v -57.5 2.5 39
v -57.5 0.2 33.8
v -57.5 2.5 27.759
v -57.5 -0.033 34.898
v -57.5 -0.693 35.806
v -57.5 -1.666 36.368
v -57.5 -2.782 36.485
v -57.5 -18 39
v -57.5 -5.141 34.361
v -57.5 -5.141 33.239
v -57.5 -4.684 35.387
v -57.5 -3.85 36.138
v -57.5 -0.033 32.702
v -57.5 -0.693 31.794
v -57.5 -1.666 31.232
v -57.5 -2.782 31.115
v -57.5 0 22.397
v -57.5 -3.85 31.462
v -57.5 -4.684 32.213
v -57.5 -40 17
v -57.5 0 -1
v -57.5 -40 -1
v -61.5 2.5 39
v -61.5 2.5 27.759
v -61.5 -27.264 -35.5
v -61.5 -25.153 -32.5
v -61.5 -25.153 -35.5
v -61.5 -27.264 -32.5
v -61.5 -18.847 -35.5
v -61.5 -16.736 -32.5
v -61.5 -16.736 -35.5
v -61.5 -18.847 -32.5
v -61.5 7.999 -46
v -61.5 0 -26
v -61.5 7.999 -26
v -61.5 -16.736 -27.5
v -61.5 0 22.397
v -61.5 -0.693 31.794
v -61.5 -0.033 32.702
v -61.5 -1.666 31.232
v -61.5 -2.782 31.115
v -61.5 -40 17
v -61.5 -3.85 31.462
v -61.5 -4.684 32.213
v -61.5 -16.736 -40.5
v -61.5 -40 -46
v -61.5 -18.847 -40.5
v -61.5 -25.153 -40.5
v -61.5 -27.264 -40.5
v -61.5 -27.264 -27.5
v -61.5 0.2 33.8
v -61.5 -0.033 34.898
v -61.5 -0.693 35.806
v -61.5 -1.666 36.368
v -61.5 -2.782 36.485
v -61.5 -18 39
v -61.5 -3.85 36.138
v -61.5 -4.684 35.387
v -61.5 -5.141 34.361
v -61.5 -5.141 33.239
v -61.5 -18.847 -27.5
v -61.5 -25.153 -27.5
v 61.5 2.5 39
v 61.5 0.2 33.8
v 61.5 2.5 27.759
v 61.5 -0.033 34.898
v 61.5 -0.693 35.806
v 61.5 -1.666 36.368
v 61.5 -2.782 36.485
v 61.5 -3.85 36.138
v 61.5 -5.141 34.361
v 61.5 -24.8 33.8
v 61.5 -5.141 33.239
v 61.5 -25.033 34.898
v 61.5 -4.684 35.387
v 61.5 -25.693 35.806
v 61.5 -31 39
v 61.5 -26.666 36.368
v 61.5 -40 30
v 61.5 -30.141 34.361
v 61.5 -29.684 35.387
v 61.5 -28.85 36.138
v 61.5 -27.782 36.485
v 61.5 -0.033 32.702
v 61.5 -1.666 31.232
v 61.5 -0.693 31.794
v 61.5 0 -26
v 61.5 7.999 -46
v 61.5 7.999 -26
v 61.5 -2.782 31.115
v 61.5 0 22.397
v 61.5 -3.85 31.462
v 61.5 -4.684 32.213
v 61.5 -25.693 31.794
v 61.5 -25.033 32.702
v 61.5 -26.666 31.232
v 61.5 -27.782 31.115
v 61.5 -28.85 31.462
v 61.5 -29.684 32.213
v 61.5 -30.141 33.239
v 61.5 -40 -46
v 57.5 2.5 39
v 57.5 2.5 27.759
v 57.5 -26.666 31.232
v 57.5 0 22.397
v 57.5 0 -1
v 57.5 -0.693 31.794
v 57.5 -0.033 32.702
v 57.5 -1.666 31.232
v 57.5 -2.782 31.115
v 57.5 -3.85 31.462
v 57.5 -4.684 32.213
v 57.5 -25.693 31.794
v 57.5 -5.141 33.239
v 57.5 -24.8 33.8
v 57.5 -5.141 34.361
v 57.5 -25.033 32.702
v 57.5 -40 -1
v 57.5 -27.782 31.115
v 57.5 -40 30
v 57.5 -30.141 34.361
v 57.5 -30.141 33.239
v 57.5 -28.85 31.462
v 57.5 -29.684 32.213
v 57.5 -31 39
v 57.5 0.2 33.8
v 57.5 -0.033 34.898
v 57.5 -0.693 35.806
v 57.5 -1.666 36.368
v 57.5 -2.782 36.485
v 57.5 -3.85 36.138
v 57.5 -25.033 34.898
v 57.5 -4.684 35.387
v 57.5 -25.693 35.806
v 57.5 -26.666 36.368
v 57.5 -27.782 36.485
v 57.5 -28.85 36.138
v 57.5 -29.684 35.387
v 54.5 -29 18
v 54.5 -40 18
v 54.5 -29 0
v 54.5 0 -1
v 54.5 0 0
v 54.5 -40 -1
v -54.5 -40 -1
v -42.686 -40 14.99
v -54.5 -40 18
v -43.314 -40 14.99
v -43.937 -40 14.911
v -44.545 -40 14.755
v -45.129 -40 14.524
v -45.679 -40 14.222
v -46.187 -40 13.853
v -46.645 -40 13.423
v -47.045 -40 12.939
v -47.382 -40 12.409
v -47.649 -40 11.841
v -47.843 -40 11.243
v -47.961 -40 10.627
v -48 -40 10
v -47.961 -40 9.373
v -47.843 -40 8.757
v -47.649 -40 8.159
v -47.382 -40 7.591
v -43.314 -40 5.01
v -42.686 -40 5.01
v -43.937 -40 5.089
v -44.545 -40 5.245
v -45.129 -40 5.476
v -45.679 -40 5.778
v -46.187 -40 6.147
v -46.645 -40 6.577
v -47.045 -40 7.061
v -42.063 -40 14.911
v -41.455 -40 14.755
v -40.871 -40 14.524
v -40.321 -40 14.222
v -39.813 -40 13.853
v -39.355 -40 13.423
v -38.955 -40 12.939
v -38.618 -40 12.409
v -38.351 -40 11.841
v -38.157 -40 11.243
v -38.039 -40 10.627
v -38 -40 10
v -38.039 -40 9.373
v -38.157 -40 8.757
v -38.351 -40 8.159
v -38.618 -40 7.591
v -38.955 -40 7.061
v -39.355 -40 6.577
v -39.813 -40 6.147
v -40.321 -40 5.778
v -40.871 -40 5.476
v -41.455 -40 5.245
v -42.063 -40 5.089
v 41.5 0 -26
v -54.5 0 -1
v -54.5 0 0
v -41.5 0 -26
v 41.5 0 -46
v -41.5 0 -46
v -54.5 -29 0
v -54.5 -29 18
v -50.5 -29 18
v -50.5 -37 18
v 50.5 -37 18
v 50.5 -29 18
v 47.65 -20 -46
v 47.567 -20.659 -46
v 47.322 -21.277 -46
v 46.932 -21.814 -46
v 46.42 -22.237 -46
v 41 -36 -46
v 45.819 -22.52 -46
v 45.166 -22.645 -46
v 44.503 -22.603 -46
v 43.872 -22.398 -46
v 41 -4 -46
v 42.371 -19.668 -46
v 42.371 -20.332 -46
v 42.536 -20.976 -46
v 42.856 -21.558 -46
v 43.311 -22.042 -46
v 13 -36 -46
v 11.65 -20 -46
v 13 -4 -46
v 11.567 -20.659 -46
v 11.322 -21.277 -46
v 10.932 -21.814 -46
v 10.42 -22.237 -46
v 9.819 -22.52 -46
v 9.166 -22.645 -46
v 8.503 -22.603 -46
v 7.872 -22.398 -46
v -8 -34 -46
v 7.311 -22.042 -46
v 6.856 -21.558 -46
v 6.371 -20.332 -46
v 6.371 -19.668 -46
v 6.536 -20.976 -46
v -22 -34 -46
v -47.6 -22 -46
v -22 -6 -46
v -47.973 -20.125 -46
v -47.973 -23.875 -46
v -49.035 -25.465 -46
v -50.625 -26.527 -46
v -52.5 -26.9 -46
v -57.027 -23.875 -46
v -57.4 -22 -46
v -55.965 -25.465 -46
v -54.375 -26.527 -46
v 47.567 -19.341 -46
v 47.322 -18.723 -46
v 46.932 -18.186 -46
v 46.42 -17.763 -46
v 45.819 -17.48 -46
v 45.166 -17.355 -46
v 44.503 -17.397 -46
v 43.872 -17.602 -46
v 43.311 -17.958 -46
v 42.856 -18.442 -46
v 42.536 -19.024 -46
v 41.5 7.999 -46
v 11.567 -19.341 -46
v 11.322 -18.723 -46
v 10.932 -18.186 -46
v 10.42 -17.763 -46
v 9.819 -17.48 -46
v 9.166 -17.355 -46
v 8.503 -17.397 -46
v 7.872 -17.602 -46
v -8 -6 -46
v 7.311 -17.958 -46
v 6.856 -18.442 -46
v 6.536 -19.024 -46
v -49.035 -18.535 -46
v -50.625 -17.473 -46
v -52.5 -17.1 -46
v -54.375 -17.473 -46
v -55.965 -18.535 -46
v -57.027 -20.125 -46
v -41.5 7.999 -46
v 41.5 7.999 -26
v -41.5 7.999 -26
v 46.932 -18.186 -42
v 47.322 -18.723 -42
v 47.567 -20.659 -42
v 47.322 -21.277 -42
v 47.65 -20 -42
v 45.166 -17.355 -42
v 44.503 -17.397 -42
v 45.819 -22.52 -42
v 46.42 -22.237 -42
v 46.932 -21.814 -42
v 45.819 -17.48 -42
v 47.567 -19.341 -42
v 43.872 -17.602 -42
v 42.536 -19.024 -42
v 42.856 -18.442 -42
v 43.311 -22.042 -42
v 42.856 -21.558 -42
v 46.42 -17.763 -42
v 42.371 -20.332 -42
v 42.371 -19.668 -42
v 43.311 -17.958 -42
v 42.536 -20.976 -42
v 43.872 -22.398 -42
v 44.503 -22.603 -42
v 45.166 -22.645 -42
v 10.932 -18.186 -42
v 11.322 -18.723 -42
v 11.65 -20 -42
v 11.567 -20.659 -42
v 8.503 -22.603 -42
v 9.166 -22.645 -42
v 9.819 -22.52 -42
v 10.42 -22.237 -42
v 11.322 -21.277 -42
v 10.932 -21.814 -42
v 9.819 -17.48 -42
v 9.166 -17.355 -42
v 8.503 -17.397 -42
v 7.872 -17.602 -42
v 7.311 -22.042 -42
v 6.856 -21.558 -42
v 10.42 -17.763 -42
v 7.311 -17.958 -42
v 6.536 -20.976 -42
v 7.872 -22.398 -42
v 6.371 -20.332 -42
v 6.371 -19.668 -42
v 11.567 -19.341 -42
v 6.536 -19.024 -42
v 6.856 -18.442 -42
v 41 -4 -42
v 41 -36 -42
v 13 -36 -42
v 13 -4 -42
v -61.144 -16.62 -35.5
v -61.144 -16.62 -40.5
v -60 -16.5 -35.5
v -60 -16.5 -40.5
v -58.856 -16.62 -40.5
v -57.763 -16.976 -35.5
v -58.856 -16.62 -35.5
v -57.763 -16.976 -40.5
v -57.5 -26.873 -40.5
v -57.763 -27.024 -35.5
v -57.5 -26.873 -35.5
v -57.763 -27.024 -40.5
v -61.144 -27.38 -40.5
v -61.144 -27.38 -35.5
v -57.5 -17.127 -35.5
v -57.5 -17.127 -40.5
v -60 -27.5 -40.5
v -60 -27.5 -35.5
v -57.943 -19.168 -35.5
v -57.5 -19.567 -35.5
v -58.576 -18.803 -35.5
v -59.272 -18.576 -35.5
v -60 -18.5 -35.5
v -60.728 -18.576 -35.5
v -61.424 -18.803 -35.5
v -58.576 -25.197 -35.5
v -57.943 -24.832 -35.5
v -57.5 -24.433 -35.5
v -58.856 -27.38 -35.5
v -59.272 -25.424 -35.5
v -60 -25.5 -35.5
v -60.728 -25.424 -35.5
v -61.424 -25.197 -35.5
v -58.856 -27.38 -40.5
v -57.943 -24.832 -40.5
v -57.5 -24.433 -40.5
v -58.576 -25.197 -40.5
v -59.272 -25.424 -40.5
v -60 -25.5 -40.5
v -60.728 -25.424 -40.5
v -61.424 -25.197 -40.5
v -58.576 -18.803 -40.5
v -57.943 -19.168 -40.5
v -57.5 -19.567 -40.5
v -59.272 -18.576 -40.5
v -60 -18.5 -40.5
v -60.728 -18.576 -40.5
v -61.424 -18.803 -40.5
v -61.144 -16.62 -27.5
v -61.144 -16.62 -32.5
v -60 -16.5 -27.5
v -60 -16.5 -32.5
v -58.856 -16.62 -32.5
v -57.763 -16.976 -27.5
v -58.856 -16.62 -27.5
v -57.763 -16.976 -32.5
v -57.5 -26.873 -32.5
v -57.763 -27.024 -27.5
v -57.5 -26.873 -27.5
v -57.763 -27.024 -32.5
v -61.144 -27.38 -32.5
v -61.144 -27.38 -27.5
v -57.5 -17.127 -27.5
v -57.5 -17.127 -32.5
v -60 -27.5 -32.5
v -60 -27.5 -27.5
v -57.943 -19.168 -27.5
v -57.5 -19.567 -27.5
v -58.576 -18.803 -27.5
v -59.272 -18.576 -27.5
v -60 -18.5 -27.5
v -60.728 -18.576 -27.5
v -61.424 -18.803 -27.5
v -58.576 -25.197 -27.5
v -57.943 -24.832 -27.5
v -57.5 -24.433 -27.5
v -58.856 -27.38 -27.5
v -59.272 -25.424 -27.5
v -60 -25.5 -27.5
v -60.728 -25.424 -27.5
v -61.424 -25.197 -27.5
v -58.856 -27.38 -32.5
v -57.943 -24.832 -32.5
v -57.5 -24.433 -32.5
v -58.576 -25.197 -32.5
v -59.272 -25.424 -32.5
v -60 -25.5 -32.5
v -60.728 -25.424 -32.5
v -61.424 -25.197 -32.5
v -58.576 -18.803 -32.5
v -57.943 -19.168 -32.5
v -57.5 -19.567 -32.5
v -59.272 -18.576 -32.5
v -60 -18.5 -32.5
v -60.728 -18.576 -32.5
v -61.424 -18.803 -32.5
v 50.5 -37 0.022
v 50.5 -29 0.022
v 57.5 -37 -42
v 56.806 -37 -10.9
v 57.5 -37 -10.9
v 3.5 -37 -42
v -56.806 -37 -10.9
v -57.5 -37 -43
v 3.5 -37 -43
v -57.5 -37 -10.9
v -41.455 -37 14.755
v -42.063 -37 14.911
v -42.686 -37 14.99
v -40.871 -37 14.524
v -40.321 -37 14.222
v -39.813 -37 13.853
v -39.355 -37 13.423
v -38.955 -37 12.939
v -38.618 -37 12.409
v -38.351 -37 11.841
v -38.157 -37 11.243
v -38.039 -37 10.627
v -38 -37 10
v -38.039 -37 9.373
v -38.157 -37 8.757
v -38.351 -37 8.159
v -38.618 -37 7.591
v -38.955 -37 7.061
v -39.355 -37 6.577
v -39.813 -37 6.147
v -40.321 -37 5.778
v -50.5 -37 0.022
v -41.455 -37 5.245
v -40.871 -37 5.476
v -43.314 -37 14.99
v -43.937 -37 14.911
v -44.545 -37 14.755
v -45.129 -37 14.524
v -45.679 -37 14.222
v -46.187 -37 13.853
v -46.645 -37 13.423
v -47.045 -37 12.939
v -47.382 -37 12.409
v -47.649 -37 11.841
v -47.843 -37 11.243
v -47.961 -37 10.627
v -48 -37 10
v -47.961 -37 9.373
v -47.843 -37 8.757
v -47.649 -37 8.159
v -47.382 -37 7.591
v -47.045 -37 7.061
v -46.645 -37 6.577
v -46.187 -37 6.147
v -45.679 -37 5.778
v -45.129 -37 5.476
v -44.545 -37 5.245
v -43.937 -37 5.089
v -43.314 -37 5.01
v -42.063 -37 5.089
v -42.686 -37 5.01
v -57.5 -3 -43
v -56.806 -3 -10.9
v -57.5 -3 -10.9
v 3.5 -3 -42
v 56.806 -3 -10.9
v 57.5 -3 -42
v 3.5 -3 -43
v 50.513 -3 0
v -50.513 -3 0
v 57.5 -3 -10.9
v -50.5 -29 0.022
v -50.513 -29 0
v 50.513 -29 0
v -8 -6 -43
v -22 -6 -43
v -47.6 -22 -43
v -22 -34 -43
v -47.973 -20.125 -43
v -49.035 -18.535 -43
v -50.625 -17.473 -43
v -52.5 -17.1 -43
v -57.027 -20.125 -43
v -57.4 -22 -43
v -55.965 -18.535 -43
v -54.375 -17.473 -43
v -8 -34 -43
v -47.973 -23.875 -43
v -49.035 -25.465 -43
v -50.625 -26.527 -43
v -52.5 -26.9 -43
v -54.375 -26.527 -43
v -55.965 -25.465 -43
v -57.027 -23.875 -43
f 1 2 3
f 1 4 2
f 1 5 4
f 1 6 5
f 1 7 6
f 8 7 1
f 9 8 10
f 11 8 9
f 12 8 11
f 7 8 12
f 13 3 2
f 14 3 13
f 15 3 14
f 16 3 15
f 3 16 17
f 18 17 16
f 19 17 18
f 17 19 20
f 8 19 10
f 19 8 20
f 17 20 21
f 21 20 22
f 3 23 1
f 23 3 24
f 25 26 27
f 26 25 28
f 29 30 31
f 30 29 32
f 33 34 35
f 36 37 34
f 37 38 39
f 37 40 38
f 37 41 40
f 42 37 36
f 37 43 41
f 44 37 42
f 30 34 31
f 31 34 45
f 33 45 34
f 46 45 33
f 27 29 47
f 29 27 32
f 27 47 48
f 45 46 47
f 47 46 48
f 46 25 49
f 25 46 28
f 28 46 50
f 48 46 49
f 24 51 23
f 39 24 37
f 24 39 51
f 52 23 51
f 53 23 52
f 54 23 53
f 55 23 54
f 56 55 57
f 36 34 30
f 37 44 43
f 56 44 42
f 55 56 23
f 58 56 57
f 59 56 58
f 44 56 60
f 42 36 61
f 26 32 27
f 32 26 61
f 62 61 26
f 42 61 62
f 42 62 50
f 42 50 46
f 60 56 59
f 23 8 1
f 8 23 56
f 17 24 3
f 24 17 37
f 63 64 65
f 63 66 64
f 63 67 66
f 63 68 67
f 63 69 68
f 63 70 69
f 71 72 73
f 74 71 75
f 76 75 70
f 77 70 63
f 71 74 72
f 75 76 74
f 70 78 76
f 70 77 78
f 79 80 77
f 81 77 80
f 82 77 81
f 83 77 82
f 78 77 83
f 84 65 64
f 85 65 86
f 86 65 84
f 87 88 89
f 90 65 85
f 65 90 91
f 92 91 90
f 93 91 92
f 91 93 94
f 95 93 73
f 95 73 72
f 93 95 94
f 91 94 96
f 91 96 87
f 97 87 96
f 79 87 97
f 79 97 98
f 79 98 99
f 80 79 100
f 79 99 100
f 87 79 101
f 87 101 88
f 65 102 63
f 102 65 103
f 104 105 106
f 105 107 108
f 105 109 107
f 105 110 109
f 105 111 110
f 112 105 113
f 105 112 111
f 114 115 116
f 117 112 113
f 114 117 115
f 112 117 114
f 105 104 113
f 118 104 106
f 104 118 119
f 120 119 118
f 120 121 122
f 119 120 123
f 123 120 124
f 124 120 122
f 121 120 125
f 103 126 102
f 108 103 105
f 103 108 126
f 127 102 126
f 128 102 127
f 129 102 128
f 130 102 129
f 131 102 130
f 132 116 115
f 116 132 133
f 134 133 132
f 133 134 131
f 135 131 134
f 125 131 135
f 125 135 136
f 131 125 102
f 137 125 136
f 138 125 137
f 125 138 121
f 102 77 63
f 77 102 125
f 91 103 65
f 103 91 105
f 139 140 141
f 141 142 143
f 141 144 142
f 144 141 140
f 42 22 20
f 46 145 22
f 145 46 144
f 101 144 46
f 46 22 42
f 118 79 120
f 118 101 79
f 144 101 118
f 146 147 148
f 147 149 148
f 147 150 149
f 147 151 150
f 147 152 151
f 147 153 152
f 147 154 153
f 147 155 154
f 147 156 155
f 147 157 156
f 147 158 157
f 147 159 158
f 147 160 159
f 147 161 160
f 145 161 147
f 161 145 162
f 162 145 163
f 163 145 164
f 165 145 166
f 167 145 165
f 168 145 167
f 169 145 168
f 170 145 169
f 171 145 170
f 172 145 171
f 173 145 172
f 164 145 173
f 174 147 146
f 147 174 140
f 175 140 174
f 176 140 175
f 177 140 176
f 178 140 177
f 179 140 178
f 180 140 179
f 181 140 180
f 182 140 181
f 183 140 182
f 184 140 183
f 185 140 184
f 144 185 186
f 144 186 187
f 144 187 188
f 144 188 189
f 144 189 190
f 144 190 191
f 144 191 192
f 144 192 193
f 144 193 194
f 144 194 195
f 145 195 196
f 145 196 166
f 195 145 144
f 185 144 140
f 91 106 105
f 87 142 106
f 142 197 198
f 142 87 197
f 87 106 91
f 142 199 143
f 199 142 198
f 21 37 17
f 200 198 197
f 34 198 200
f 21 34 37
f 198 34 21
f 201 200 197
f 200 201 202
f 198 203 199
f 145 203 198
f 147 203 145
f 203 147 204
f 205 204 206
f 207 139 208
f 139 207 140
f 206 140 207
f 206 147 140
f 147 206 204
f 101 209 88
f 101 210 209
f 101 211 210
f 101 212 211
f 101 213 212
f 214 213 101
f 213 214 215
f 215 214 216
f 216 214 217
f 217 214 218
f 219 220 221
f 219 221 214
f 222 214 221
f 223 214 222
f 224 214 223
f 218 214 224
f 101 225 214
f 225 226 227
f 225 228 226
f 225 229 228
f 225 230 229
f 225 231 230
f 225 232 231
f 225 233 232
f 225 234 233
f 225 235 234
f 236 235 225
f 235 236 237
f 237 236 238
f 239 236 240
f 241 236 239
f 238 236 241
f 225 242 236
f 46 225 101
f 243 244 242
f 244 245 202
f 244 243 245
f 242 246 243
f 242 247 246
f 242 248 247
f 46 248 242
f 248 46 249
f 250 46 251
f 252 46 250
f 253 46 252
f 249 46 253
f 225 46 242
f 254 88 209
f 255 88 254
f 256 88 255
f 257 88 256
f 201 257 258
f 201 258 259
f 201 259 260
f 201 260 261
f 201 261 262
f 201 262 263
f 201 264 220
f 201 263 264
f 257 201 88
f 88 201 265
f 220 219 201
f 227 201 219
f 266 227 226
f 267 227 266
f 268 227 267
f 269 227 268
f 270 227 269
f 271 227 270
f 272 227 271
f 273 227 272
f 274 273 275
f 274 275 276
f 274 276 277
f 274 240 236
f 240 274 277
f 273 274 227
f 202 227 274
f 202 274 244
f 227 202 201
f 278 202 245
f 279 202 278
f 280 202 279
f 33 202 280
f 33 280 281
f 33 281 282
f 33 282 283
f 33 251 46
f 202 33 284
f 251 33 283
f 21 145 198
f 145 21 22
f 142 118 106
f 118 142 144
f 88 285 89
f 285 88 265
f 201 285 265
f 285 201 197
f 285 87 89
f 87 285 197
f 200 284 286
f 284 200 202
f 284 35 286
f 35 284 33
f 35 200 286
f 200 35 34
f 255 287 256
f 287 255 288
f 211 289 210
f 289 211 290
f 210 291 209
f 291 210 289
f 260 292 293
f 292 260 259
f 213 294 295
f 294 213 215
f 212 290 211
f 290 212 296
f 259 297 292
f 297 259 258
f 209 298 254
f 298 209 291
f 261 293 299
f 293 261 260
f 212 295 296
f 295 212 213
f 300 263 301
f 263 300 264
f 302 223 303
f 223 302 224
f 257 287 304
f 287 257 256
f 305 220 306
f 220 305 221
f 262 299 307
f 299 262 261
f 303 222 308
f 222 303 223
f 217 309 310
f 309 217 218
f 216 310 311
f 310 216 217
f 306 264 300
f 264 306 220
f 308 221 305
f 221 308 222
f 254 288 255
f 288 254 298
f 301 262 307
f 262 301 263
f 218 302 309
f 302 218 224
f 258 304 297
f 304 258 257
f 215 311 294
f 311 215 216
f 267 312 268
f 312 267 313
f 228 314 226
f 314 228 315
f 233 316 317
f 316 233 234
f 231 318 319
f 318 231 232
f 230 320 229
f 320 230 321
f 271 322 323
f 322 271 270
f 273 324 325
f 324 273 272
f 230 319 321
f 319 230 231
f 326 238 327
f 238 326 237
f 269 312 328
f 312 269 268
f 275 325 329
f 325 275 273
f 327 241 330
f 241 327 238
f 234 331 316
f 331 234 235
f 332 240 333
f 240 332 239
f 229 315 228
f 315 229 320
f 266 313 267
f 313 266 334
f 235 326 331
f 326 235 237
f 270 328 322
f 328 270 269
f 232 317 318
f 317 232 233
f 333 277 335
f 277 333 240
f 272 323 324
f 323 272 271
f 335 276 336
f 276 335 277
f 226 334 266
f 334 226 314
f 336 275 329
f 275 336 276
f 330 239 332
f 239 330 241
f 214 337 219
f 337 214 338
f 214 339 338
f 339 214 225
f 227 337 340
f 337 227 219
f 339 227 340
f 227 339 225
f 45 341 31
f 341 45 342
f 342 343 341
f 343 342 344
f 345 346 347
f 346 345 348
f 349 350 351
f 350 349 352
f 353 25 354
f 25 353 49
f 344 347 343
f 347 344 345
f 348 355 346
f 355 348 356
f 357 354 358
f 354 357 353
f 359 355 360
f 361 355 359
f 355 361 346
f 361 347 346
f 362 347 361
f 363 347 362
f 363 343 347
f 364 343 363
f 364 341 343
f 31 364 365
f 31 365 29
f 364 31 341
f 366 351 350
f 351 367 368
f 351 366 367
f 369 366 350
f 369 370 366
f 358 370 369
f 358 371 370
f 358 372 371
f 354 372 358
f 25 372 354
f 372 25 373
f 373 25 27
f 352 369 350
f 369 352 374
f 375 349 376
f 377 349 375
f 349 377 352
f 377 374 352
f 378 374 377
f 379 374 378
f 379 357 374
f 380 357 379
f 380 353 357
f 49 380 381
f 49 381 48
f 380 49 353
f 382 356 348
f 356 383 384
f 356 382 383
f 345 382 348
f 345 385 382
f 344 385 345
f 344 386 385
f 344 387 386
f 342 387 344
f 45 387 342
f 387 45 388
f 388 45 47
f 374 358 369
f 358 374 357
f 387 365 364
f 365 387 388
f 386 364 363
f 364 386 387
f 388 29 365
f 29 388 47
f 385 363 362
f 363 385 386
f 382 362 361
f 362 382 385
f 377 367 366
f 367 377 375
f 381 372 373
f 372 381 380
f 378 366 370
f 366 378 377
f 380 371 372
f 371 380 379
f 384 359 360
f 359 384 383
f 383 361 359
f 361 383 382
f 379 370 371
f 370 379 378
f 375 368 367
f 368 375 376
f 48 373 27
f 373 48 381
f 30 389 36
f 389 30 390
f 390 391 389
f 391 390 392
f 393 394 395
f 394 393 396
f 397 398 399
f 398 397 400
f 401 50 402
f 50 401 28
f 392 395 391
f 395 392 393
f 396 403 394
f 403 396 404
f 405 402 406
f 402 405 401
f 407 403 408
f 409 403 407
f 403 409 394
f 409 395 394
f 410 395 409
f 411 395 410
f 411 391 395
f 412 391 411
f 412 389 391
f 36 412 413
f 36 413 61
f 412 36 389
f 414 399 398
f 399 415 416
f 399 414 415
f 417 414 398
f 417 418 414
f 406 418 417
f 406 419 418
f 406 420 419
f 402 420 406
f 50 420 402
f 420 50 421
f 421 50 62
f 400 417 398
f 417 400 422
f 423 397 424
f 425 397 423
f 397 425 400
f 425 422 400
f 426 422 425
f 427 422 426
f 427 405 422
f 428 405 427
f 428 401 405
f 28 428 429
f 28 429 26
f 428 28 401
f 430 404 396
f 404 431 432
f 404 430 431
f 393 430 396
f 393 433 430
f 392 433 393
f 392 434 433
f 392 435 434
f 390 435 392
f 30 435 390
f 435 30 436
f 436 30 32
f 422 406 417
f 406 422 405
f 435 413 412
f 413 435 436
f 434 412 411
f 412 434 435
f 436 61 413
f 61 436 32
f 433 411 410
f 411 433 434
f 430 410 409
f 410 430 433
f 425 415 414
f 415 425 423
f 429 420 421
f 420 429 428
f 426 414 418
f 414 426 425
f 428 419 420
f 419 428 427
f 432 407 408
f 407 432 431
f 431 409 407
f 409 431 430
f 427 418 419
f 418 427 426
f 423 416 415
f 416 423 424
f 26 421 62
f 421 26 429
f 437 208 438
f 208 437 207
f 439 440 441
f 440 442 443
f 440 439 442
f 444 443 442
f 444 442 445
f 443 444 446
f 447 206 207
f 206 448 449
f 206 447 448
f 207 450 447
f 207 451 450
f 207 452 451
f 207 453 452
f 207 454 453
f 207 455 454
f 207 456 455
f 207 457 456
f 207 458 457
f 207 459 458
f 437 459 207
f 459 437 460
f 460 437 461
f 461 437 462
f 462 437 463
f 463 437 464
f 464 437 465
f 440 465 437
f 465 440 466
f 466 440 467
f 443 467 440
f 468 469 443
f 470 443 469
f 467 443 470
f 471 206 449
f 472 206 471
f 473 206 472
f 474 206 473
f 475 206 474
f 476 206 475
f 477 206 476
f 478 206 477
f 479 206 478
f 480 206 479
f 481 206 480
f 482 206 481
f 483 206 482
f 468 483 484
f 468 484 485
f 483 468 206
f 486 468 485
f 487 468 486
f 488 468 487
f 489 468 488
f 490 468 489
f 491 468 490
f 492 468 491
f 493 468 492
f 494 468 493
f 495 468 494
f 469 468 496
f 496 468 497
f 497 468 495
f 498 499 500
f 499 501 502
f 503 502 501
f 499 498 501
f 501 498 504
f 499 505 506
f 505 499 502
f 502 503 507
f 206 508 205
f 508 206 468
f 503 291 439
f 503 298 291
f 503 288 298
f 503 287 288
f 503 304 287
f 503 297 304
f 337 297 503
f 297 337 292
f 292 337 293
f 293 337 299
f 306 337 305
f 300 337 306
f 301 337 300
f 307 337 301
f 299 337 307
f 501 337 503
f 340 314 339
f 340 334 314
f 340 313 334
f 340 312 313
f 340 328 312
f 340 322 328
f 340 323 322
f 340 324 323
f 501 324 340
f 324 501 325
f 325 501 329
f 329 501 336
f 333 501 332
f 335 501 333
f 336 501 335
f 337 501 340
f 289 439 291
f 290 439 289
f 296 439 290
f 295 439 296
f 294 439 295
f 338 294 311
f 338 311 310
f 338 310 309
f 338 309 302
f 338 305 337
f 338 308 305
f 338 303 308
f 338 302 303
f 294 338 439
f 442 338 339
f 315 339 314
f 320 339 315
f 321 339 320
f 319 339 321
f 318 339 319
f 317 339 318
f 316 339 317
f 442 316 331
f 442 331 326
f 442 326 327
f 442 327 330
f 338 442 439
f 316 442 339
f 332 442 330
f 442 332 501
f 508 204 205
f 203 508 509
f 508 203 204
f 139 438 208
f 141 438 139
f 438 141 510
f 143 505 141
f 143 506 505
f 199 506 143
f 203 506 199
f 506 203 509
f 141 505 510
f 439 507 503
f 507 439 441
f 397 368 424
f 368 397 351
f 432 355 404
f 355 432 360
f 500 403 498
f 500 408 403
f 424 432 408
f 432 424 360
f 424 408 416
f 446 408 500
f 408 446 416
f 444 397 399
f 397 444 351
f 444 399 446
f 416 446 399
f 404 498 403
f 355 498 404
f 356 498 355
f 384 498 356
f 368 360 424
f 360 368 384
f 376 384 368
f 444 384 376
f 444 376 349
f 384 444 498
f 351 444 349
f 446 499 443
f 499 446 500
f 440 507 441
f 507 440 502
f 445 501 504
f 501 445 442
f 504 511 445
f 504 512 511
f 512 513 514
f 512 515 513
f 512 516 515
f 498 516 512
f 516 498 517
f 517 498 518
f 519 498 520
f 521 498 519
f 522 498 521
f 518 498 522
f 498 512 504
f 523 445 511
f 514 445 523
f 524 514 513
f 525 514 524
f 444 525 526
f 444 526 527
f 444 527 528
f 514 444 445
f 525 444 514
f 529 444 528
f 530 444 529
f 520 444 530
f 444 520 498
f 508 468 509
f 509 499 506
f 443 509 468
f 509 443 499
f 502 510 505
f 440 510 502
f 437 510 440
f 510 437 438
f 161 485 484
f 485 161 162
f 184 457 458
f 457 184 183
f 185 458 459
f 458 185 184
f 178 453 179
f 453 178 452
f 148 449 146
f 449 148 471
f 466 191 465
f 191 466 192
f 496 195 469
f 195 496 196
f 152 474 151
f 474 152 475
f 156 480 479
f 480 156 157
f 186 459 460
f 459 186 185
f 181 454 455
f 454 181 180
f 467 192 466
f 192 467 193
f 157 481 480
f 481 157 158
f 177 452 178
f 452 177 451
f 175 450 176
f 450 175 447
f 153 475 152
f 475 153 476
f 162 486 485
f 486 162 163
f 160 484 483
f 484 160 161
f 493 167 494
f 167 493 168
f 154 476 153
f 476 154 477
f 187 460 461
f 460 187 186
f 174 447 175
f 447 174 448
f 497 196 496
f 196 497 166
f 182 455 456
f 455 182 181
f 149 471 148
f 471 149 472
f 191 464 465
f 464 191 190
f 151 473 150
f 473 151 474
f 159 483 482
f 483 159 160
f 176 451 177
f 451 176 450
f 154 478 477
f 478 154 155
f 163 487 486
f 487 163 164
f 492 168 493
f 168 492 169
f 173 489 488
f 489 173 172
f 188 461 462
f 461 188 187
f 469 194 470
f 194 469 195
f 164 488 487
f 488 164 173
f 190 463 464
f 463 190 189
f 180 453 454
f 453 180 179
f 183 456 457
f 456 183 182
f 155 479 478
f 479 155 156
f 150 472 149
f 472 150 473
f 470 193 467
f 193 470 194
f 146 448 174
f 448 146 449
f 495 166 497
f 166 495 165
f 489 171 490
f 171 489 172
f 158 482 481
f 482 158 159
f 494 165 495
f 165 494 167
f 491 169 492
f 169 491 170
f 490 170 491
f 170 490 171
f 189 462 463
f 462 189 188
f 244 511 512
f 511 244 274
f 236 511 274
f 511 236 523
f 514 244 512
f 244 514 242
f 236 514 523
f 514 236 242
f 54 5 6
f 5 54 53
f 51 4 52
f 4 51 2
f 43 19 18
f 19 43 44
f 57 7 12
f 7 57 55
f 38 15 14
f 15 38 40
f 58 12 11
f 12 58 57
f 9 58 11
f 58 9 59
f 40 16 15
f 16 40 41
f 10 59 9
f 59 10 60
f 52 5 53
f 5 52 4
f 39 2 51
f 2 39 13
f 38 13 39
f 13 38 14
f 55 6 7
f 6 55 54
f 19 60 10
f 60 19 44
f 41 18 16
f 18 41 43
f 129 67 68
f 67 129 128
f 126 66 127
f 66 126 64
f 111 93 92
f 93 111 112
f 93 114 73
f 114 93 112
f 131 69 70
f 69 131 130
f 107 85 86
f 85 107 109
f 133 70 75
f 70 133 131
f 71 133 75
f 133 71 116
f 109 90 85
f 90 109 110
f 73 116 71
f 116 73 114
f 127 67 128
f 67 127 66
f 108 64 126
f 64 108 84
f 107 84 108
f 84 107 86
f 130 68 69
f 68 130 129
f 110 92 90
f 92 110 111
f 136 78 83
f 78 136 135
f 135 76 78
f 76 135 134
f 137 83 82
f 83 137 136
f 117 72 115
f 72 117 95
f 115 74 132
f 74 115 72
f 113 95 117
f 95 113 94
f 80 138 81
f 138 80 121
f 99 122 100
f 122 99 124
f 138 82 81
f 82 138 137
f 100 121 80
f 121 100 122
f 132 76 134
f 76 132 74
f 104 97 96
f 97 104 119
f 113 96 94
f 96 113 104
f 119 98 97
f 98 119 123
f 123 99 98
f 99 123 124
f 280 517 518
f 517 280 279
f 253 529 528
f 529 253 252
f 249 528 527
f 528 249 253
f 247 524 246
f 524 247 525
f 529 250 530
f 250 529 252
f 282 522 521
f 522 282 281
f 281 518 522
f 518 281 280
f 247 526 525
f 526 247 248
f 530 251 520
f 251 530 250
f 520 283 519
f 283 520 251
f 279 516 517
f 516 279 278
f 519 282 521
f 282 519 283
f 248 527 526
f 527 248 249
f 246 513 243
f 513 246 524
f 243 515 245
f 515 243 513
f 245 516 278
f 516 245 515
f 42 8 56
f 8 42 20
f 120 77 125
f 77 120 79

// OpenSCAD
module psu(){
union(){
	difference(){
		translate([-114/2,0,-8])cube([114,200,50]);
		translate([-55,-0.01,2.01])cube([110,18,40]);
	}
	translate([-38,-0.01,2.01])cube([90,18,9]);
	translate([-37.5,2,2.01])
		for( i=[0:8]) translate([i*10,0,0])
		cube([9,10,10]);
}
translate([-65,32,5])rotate([0,90,0])cylinder(r=2,$fn=15,h=130);
translate([-35,32,30])rotate([0,90,0])cylinder(r=2,$fn=15,h=100);
translate([-114/2+32,32,-16])rotate([0,0,0])cylinder(r=2,$fn=15,h=15);
translate(){
translate([-57,1.5+6,30-12])rotate([0,90,0])oval();
translate([-57,1.5+6+7,30-12])rotate([0,90,0])oval();
translate([-57,1.5+6+14,30-12])rotate([0,90,0])oval();
translate([55,1.5+6,30-12])rotate([0,90,0])oval();
translate([55,1.5+6+7,30-12])rotate([0,90,0])oval();
translate([55,1.5+6+14,30-12])rotate([0,90,0])oval();
}
}

*%psu();
*enclosure();
module plug(){
cube([28,41,32],center=true);
for(i=[-1,1])translate([-18*i,-11,0])rotate([90,0,0])cylinder(r=5.3/2,h=10,$fn=25);
}
module switch(){
cylinder(r=20.5/2,h=39);
translate([0,-2.4/2,0])cube([11.5,2.4,39]);
}
module rswitch(){
translate([0,0,39/2])cube([28,14,39],true);
}

module clover(d=2,x=1.2){
for(i=[-1,1])
	for(j=[-1,1])
		translate([i*x,j*x])
			cylinder(r=d,h=30);

}

module ring(d=10,h=4,o=1.5){
difference(){
cylinder(r=d,h=h,center=true,$fn=30);
cylinder(r=d-o,h=h+1,center=true,$fn=30);


}
}
module oval(rad=3,len=21,w=2,fn=20){
translate([len/2,0,0])cylinder(r=rad/2,h=w,$fn=fn);
translate([-len/2,0,0])cylinder(r=rad/2,h=w,$fn=fn);
translate([0,0,w/2])cube([len,rad,w],center=true);
}
module enclosure(){
difference(){
union(){
translate([-109/2,-46,0])cube([109,64,40]);
translate([-115.5/2,-46,0])cube([115.5,45,40]);
translate([-109/2-7,-46,0])cube([4,85,40]); // extented Y by 1
difference(){
	translate([-109/2-7,19,-2.5])cube([4,20,20]);
	translate([-109/2-7.25,17,-3]) rotate([-25,0,0]) cube([4.5,10,5]);
}
translate([109/2+3,-46,0])cube([4,85,40]); // extended Y by 1
difference(){	
	translate([109/2+3,19,-2.5])cube([4,20,20]);
	translate([109/2+2.75,17,-3]) rotate([-25,0,0]) cube([4.5,10,5]);
}
translate([34.5+7,-46,-7.999])cube([20,20,8]);
translate([-61.5,-46,-7.999])cube([20,20,8]);
}
translate([-101/2,-42,3])cube([101,60.1,34]);
translate([-110/2,0,-5])cube([110,30,34]);
translate([-115/2,-42,3])cube([115,31.1,34]);
translate([-115/2,-43,3])cube([61,31.1,34]);
translate([-22.8,-32,3])rotate([0,0,60])cube([40,40,34]);
translate([22.8,-32,3])rotate([0,0,30])cube([40,40,34]);

translate([-101/2,0.01,-0.01])cube([103,18,16]);
translate([-43,10,20])cylinder(r=5,h=30,$fn=50);

translate([27,-26,20])plug();
translate([-15,-8,20])rotate([90,-90,0])rswitch();

//Side mounting holes
//Moved all holes 1.8 in Y and 2.5 in Z. Enlarged the holes by 1
translate([-65,33.8,2.5])rotate([0,90,0])cylinder(r=2.7,$fn=15,h=15); 
translate([56,33.8,2.5])rotate([0,90,0])cylinder(r=2.7,$fn=15,h=15);
translate([56,33.8,27.5])rotate([0,90,0])cylinder(r=2.7,$fn=15,h=15);

translate([-52.5,-20,22])rotate([90,-90,0])cylinder(r=9.8/2,h=30);
translate([-66,42,15])rotate([45,0,0])cube([10,20,40]);
translate([56,42,28])rotate([45,0,0])cube([10,20,40]);
translate([-103,0,0])rotate([0,0,90]){
translate([-38,-43,22])rotate([0,90,0])ring(5.5,5,2);
translate([-30,-43,22])rotate([0,90,0])ring(5.5,5,2);
}
}
}

rotate([90,0,0])enclosure();
